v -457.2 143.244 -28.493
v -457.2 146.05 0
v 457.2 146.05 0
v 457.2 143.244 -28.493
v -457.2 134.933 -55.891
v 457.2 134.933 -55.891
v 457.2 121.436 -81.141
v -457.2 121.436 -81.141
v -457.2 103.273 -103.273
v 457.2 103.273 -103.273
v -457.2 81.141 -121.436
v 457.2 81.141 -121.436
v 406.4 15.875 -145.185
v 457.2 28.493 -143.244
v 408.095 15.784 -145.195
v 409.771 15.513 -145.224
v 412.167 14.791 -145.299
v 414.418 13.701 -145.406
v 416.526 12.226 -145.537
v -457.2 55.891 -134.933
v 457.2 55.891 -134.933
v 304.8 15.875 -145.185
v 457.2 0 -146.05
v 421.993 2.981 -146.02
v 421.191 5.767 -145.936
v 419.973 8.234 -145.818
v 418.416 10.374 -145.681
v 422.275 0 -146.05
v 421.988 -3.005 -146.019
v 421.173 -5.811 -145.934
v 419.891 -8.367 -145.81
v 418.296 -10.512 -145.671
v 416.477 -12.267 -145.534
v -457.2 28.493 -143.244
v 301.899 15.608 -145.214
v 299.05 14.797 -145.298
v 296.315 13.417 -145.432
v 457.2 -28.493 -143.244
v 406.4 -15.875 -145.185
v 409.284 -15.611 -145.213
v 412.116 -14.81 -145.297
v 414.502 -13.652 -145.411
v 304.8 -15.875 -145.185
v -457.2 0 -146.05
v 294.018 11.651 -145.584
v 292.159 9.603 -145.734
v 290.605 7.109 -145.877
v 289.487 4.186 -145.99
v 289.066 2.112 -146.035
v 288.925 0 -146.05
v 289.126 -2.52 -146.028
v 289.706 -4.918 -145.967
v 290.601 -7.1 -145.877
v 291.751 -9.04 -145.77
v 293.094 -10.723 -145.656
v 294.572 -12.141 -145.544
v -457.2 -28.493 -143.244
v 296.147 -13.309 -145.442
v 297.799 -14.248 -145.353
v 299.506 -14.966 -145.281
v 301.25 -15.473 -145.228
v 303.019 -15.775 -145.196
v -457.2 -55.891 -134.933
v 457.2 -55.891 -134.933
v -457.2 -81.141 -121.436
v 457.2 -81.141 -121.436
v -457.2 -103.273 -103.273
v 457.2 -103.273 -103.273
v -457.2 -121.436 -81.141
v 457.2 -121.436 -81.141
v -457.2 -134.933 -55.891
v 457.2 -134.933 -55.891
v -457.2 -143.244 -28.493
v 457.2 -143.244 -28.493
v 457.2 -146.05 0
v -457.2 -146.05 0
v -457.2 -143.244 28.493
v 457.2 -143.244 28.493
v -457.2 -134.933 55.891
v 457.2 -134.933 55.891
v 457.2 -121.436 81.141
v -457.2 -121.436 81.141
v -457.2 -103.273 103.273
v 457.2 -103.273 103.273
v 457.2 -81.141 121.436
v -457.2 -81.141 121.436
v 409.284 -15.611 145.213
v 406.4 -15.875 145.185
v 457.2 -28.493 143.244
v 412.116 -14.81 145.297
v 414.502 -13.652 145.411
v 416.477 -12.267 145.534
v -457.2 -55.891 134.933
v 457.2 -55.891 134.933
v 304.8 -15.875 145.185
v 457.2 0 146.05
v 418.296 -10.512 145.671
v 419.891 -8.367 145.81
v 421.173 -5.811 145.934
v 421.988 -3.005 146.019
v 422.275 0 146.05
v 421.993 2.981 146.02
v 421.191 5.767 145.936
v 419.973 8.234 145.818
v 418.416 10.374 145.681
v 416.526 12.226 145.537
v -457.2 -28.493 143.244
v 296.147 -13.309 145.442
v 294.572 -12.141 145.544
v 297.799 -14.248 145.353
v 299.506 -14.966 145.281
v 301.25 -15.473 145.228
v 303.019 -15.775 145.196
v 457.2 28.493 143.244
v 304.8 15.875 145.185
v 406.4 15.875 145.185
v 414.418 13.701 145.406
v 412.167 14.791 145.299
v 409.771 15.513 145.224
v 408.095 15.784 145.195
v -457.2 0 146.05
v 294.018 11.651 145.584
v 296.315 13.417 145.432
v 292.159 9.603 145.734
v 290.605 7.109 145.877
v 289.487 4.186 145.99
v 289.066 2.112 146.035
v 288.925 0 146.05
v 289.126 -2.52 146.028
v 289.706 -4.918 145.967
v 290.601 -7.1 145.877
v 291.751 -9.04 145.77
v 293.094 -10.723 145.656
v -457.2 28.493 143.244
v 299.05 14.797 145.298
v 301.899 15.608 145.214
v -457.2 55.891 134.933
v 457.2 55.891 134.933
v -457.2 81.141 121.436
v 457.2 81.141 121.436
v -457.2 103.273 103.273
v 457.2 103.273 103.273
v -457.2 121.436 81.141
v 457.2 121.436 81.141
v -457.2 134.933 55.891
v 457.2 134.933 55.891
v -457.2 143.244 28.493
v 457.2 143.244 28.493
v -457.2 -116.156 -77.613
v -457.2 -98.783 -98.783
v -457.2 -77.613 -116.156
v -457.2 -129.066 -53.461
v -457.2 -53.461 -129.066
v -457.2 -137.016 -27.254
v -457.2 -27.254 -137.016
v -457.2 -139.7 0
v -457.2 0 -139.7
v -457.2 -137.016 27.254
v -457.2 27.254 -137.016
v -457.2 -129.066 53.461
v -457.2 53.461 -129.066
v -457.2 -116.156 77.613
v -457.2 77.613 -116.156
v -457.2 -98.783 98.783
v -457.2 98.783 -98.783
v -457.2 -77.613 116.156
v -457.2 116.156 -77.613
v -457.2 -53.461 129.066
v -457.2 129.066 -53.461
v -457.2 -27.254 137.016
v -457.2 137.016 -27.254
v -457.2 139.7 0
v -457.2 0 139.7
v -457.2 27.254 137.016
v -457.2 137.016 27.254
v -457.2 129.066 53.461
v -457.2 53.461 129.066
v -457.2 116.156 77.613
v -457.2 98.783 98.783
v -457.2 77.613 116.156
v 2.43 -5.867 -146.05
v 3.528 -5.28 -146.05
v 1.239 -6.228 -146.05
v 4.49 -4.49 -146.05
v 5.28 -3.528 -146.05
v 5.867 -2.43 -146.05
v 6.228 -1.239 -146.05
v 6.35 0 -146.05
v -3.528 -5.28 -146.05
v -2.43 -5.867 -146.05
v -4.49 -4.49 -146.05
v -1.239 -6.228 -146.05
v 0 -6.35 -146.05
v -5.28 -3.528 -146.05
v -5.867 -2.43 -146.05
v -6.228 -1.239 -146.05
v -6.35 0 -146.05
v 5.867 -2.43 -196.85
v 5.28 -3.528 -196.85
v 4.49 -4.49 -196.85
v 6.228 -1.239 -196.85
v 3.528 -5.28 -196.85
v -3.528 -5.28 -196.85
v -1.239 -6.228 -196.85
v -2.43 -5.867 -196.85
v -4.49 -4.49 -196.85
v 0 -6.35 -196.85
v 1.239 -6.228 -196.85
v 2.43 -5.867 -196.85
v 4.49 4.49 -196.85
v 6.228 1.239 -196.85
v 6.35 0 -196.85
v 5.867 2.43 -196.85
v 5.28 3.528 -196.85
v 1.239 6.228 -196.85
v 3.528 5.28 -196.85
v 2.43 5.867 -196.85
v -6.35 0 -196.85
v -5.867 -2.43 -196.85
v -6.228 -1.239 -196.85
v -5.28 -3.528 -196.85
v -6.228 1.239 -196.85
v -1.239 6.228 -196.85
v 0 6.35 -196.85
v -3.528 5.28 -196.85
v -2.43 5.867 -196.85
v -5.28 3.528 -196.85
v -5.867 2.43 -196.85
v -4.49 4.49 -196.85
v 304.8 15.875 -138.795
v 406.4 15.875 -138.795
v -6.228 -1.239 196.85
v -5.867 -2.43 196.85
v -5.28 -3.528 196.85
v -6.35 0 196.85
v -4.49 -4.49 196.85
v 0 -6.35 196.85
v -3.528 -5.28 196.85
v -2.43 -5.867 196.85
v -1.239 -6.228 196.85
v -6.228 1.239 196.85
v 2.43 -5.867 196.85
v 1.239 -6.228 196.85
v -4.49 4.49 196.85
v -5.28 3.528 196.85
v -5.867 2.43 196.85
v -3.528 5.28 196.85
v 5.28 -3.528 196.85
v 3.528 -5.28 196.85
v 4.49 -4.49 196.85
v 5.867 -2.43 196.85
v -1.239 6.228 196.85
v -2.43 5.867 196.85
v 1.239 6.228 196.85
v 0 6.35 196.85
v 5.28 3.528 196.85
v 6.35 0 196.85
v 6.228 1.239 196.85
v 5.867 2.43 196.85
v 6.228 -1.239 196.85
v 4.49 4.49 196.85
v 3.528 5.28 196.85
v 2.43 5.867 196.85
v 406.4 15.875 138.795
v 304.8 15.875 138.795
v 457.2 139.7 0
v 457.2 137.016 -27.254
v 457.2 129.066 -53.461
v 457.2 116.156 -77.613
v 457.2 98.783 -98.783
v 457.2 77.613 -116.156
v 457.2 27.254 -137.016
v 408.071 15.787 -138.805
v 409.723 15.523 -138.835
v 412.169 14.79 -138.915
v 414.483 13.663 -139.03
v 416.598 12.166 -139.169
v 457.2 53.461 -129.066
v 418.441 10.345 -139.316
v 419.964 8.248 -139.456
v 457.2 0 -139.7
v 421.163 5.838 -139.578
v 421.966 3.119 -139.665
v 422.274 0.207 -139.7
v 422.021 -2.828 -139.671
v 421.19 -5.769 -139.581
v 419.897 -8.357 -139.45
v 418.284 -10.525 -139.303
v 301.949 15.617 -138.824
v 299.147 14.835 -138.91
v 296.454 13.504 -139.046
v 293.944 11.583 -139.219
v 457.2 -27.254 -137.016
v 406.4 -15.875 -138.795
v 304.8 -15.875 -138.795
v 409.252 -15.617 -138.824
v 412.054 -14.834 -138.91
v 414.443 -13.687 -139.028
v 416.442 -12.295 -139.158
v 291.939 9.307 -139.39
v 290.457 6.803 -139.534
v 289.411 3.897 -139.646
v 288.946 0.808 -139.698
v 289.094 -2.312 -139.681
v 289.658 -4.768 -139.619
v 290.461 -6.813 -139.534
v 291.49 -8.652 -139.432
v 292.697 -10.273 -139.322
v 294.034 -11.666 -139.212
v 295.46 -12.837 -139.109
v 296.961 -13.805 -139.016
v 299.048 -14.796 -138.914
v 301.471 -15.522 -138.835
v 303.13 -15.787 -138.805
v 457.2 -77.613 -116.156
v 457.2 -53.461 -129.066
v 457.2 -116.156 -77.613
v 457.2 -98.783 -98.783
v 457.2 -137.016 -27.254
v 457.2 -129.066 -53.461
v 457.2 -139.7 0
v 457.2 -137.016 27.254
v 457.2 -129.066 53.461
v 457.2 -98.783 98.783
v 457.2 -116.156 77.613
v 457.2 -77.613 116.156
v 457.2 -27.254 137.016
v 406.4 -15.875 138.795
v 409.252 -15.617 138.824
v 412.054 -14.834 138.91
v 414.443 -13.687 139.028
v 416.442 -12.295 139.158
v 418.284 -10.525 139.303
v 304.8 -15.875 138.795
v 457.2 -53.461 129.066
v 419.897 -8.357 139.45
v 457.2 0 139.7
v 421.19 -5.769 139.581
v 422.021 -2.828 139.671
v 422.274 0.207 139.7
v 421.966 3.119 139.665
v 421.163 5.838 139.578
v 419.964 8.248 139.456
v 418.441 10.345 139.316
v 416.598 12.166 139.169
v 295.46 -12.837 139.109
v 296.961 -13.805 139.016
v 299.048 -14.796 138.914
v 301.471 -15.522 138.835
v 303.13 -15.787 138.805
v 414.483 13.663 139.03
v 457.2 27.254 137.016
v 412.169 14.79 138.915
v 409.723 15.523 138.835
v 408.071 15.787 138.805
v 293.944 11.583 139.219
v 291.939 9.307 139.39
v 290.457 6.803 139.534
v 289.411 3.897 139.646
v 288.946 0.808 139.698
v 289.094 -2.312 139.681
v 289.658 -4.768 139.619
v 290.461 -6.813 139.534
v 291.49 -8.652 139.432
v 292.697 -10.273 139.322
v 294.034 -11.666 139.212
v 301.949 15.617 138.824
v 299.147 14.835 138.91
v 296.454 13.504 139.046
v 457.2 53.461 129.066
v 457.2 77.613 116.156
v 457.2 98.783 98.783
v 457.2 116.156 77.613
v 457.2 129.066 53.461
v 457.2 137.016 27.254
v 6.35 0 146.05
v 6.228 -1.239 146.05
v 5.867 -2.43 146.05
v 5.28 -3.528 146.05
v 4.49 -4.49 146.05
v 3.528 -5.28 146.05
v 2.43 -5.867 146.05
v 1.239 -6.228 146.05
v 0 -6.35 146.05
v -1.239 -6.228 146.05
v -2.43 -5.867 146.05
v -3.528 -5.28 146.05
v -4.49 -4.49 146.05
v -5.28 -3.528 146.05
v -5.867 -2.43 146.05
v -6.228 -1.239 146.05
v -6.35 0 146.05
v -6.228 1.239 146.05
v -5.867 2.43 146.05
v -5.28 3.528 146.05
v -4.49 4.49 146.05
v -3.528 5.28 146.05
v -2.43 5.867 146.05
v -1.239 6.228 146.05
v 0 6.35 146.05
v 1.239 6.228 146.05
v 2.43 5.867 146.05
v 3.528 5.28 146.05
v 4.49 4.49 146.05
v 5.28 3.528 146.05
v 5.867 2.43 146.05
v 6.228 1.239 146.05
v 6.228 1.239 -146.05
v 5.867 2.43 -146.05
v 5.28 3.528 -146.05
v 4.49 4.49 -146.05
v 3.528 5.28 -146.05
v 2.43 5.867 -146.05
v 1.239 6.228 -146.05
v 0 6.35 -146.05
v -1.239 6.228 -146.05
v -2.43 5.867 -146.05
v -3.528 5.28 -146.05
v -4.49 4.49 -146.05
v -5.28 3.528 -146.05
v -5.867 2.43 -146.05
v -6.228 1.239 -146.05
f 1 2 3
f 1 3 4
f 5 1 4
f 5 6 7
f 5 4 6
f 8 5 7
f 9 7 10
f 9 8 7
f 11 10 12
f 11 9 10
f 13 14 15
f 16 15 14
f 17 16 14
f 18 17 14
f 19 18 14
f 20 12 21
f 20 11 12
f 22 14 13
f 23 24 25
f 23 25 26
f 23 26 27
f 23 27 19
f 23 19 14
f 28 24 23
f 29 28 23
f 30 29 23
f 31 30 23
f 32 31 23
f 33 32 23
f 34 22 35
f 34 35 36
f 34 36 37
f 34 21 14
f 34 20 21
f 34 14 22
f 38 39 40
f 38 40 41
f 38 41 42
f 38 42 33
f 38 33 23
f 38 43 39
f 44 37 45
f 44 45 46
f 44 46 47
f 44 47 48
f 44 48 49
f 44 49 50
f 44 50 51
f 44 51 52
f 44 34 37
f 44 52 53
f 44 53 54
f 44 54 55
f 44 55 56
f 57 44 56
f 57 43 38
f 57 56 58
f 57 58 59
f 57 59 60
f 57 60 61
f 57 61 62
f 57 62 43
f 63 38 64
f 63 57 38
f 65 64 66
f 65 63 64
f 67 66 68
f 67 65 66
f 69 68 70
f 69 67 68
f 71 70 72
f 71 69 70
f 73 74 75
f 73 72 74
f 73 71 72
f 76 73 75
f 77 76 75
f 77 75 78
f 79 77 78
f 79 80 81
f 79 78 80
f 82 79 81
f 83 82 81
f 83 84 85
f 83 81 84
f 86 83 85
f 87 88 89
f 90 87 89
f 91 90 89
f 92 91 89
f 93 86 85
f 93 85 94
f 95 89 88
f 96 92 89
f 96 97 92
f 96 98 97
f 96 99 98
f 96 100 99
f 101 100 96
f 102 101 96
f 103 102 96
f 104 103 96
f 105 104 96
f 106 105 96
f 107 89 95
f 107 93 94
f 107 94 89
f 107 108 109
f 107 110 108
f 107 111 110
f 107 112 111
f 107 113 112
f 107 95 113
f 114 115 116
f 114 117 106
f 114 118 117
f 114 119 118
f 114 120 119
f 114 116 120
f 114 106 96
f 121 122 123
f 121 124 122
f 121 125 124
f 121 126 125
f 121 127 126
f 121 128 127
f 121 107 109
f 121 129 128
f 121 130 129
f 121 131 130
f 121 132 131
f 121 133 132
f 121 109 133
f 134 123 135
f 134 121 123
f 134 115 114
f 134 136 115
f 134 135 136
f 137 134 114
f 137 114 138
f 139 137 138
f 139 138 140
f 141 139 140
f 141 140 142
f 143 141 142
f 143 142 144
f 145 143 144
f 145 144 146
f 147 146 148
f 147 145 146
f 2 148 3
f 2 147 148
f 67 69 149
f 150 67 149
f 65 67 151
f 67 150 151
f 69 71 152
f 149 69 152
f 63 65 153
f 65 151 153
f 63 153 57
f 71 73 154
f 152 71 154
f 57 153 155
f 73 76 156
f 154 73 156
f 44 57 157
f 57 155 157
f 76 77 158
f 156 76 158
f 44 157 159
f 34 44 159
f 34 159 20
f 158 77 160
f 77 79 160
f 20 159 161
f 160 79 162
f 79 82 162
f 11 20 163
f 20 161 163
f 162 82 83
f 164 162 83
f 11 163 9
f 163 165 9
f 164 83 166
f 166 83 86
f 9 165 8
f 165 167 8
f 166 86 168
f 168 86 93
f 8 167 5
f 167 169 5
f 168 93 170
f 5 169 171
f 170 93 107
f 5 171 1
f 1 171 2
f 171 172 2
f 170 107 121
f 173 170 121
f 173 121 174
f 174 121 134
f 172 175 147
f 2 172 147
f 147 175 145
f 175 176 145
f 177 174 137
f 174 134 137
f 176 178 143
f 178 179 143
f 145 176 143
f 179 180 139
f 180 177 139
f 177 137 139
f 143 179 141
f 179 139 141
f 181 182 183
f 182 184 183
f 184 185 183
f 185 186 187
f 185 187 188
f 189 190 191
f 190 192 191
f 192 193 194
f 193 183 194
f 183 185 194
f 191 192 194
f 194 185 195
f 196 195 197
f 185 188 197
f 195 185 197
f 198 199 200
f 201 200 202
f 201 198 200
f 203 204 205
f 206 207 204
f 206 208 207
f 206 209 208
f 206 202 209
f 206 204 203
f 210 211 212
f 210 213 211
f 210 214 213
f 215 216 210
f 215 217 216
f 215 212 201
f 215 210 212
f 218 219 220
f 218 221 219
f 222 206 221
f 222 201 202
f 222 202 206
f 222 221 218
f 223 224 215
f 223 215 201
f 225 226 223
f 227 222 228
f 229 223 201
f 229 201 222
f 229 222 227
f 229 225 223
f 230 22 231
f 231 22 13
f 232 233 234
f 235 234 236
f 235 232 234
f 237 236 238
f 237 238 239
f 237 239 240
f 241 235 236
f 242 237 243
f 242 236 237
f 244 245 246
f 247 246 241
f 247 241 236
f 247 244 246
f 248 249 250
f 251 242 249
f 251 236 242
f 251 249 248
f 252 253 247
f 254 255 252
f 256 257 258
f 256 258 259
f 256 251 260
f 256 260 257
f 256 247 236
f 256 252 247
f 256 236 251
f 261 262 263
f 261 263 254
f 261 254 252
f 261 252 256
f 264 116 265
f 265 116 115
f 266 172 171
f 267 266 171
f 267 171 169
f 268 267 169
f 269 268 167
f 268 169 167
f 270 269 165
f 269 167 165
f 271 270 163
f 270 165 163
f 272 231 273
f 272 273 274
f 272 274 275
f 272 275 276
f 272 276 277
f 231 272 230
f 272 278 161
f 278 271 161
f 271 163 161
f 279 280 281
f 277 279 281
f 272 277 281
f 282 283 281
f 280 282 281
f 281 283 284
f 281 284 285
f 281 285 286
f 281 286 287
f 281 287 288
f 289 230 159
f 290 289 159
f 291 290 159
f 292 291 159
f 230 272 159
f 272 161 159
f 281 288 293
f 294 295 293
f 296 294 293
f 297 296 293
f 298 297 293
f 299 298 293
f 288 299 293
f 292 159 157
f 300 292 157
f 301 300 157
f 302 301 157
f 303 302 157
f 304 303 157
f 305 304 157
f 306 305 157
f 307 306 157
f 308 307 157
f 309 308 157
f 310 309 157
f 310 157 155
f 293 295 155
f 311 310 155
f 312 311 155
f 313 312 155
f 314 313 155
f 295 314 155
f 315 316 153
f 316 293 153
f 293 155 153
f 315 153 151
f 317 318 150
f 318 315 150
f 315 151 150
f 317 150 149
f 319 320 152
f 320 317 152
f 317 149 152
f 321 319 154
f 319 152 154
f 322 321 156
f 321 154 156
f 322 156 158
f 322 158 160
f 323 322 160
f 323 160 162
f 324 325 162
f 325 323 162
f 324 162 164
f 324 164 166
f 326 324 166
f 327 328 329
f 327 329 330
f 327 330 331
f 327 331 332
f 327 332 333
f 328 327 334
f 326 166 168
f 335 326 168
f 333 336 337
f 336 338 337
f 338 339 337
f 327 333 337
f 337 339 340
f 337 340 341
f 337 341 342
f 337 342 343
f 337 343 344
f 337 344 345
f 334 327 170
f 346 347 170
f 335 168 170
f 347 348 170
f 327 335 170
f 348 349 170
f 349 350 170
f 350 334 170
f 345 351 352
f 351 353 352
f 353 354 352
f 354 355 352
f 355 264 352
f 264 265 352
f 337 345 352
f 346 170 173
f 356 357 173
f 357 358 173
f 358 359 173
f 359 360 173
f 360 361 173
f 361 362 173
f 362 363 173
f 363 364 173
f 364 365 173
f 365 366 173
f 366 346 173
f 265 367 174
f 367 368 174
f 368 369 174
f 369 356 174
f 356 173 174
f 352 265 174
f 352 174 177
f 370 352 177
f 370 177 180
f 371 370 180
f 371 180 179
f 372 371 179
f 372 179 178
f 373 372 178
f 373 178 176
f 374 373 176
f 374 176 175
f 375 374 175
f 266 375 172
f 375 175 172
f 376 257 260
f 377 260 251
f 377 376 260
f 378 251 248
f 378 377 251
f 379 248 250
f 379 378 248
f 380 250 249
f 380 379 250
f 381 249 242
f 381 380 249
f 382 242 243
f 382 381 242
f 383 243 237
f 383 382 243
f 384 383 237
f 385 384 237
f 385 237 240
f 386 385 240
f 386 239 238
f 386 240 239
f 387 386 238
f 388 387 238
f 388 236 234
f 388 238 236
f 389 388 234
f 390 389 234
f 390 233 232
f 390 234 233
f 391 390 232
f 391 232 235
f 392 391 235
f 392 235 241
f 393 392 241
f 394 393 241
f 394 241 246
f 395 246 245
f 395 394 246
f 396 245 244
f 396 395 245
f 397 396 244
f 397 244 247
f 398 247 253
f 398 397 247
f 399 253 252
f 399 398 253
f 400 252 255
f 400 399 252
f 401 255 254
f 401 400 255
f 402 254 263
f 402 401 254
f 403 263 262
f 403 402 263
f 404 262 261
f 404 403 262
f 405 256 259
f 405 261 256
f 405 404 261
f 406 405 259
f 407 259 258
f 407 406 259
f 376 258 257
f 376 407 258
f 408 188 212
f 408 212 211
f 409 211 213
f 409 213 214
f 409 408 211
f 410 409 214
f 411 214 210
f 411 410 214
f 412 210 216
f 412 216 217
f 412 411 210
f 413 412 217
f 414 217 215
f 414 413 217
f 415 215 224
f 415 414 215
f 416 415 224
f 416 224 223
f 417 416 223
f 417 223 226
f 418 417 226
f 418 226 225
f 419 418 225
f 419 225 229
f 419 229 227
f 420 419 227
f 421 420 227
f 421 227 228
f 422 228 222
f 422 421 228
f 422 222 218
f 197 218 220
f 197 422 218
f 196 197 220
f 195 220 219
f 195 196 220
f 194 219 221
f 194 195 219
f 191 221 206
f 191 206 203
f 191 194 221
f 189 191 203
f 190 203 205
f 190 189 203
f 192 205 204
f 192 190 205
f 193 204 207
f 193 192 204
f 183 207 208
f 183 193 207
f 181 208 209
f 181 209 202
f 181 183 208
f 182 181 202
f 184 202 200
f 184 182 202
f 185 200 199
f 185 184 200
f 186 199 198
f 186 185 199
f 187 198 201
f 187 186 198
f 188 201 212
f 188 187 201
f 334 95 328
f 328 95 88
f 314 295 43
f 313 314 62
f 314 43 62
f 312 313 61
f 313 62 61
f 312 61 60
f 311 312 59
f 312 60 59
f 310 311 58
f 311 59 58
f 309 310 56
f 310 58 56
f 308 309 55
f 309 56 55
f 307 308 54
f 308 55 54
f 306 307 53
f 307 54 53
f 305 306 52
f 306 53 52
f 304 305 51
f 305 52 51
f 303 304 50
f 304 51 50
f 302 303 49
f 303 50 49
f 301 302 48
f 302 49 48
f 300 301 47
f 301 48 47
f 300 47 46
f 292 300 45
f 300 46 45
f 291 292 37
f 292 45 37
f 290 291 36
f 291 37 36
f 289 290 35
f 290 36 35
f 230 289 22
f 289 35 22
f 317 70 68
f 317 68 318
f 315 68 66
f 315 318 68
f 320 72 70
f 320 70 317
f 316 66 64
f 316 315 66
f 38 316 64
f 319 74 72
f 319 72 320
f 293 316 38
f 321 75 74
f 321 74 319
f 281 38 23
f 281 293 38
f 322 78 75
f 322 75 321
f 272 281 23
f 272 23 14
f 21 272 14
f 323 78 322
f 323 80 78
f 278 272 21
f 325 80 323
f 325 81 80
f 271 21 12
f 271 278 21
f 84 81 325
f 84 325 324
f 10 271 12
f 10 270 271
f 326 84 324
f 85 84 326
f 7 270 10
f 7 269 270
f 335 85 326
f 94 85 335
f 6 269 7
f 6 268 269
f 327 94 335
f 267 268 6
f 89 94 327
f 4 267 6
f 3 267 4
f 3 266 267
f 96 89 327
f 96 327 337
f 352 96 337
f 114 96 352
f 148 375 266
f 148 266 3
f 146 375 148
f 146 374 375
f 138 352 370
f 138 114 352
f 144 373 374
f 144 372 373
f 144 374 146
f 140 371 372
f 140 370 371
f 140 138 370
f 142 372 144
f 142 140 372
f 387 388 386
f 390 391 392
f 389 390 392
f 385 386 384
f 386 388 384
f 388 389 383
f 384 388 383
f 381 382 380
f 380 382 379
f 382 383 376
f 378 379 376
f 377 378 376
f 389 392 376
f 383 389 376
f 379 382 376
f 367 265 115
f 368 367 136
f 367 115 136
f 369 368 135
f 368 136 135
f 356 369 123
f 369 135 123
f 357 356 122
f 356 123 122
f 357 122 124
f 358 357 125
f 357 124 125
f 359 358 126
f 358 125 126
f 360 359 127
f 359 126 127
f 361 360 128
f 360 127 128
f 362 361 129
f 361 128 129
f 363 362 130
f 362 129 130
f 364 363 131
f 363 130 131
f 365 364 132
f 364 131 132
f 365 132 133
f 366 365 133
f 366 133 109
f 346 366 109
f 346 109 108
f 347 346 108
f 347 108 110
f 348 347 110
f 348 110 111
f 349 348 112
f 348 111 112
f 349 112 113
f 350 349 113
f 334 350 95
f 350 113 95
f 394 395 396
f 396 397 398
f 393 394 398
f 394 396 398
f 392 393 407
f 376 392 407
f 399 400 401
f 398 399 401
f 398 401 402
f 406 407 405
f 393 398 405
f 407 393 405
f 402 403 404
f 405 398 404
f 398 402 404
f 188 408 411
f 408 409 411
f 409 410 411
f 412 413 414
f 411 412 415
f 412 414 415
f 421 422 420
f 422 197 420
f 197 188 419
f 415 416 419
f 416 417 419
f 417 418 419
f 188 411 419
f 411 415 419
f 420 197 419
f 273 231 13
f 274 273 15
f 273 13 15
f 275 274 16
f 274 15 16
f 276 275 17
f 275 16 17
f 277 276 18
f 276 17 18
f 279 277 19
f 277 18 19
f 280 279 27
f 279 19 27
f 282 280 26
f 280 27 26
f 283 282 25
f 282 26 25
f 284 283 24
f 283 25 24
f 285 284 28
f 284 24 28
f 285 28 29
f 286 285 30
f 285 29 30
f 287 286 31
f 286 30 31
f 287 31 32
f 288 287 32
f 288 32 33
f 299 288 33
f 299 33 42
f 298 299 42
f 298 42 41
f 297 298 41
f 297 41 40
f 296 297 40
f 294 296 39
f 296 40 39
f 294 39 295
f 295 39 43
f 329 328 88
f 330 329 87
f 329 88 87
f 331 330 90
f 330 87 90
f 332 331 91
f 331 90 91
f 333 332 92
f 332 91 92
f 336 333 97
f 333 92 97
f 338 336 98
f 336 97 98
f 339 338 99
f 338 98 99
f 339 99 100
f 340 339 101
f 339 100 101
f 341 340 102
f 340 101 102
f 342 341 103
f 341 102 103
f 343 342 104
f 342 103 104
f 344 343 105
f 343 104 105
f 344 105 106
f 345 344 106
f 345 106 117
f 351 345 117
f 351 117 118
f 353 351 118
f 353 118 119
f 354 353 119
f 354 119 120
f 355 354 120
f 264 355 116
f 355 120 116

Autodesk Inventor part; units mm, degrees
ref_plane "XZ Plane" through (0, 0, 0) normal (0, 1, 0) x (-1, 0, 0)
sketch "Sketch1" plane through (0, 0, 0) normal (1, 0, 0) x (0, 1, 0)
  circle A0 centre (0, 0) radius 139.7
  circle A1 centre (0, 0) radius 146.05
  dimension "d0" = 279.4
  dimension "d1" = 292.1
extrude "Extrusion1" add sketch "Sketch1" along normal mid plane 914.4
ref_plane "Work Plane1" through (0, 0, 146.05) normal (0, 0, 1) x (1, 0, 0)
sketch "Sketch2" plane through (0, 0, 146.05) normal (0, 0, 1) x (1, 0, 0)
  circle A0 centre (0, 0) radius 6.35
  dimension "d4" = 12.7
extrude "Extrusion2" add sketch "Sketch2" along normal blind 50.8
sketch "Sketch3" plane through (0, 0, 146.05) normal (0, 0, 1) x (1, 0, 0)
  line L0 (304.8, 0) -> (406.4, 0) construction
  line L1 (304.8, -15.875) -> (406.4, -15.875)
  line L2 (406.4, 15.875) -> (304.8, 15.875)
  arc A0 (304.8, 15.875) -> (304.8, -15.875) centre (304.8, 0) ccw
  arc A1 (406.4, -15.875) -> (406.4, 15.875) centre (406.4, 0) ccw
  line L3 (457.2, -146.05) -> (457.2, 146.05) projected
  point P0 (0, 0)
  point P1 (355.6, 0)
  dimension "d7" = 31.75
  dimension "d8" = 101.6
  dimension "d9" = 50.8
extrude "Extrusion3" cut sketch "Sketch3" against normal up to next
mirror "Mirror1" about plane through (0, 0, 0) normal (0, 0, 1) of "Extrusion3"
mirror "Mirror2" about plane through (0, 0, 0) normal (0, 0, 1) of "Extrusion2"
ref_plane "Work Plane3" through (355.6, 0, 0) normal (1, 0, 0) x (0, 1, 0)
equation "\"d0\" = pitchingMachineTubeDiam"
equation "\"d1\" = pitchingMachineOuterTubeDiam"
equation "\"d2\" = pitchingMachineTubeLength"
equation "\"d4\" = pitchingMachineTubeAxelDiam"
equation "\"d5\" = pitchingMachineTubeAxelLength"
equation "\"d7\" = pMTubeSlotWidth"
equation "\"d8\" = pMTubeSlotLength"
equation "\"d9\" = pMTubeSlotDistanceFromBack"
equation "\"d10\" = pitchingMachineTubeAxelLength"
equation "\"pitchingMachineTubeDiam\" = boulderDiam + boulderDiamVariation"
equation "\"boulderDiam\" = 254"
equation "\"boulderDiamVariation\" = 25.4"
equation "\"pitchingMachineTubeThickness\" = 6.35"
equation "\"pitchingMachineOuterTubeDiam\" = pitchingMachineTubeDiam + 2 * pitchingMachineTubeThickness"
equation "\"pitchingMachineTubeLength\" = 914.4"
equation "\"pitchingMachineTubeAxelDiam\" = 12.7"
equation "\"pitchingMachineTubeAxelLength\" = 50.8"
equation "\"pMTubeSlotLength\" = 101.6"
equation "\"pMTubeSlotWidth\" = 31.75"
equation "\"pMTubeSlotDistanceFromBack\" = 50.8"
equation "\"d13\" = pMTubeWheelDistanceFromBack"
equation "\"pMTubeWheelDistanceFromBack\" = 355.6"
properties part number "pitchingMachineTube"
